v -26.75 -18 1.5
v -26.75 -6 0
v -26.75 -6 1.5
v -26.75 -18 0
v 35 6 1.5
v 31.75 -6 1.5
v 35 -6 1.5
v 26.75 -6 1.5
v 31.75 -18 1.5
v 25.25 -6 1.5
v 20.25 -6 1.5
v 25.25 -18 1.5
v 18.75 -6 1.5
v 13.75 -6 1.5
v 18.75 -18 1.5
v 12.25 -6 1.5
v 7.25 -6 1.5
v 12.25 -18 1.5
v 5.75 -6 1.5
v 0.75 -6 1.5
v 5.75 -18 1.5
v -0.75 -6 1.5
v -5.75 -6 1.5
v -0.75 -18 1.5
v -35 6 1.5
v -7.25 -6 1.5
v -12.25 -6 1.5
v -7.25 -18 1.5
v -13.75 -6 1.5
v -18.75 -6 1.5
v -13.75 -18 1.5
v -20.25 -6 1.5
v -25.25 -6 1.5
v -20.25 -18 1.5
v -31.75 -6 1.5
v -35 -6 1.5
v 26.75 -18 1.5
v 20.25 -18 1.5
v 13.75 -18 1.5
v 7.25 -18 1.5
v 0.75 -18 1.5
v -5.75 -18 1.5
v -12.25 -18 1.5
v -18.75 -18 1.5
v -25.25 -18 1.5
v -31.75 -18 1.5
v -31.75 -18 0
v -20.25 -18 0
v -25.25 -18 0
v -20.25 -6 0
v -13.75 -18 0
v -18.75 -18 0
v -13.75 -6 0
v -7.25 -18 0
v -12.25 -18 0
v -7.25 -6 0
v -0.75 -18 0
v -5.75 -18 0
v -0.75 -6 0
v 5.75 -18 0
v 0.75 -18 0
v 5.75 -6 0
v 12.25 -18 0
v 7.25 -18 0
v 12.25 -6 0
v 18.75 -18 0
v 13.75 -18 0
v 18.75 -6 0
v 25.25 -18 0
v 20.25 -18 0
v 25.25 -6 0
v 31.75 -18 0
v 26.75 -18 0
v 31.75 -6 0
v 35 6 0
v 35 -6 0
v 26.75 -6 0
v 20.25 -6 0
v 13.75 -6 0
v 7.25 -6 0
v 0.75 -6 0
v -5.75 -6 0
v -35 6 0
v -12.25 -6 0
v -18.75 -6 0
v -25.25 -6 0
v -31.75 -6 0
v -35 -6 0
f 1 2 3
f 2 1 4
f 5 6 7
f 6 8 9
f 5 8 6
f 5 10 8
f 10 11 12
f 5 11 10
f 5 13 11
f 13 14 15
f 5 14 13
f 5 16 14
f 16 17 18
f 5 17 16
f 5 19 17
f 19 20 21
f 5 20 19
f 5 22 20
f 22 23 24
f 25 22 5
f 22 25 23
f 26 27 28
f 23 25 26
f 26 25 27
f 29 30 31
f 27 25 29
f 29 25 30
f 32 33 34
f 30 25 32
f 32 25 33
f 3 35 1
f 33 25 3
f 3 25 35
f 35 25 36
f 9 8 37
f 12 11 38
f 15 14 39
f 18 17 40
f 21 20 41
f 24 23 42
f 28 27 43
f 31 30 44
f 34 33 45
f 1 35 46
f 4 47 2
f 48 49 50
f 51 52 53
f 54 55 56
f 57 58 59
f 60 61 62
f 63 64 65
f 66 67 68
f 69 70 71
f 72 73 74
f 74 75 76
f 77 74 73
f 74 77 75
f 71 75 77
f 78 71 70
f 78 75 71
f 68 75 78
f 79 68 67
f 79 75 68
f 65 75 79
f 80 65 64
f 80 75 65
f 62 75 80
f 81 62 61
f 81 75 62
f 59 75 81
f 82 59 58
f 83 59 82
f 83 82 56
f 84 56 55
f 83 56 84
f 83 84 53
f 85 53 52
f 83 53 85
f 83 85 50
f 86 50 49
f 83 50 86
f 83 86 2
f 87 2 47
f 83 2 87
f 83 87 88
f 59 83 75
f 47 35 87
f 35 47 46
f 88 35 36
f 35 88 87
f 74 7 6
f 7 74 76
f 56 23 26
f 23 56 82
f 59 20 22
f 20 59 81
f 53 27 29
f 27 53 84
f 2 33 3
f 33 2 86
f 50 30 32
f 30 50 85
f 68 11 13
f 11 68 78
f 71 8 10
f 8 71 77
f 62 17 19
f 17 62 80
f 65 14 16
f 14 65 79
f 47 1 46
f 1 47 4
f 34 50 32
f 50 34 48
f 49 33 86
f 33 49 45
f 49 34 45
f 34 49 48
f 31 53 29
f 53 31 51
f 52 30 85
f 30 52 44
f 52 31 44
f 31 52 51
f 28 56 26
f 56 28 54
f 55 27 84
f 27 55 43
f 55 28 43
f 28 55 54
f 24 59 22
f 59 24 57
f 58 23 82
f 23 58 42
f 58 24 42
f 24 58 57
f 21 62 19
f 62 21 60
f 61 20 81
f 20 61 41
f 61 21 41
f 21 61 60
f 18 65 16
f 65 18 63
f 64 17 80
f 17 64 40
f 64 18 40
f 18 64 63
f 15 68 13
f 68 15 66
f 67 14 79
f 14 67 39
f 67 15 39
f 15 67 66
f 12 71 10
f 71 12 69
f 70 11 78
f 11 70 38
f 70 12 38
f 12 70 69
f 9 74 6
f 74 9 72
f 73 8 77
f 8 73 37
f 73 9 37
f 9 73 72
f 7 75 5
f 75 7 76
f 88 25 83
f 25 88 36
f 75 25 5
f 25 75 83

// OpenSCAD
$fn = 64;

// Dimensions
thickness = 1.5;          // Plate thickness in Z
spine_len_x = 70;         // Spine length in X
spine_wid_y = 12;         // Spine width in Y
num_teeth = 10;           // Number of teeth
tooth_wid_x = 5.0;        // Tooth width in X
tooth_len_y = 12;         // Tooth length in Y
gap_wid_x = 1.5;          // Gap width between teeth in X

// Calculate total width of the tooth row to center it on the spine
total_tooth_row_x = num_teeth * tooth_wid_x + (num_teeth - 1) * gap_wid_x;
start_x = -total_tooth_row_x / 2;

union() {
    // Spine (back bar)
    translate([-spine_len_x / 2, -spine_wid_y / 2, 0])
        cube([spine_len_x, spine_wid_y, thickness]);

    // Teeth row
    for (i = [0 : num_teeth - 1]) {
        x_pos = start_x + i * (tooth_wid_x + gap_wid_x);
        y_pos = -spine_wid_y / 2 - tooth_len_y;
        translate([x_pos, y_pos, 0])
            cube([tooth_wid_x, tooth_len_y, thickness]);
    }
}
